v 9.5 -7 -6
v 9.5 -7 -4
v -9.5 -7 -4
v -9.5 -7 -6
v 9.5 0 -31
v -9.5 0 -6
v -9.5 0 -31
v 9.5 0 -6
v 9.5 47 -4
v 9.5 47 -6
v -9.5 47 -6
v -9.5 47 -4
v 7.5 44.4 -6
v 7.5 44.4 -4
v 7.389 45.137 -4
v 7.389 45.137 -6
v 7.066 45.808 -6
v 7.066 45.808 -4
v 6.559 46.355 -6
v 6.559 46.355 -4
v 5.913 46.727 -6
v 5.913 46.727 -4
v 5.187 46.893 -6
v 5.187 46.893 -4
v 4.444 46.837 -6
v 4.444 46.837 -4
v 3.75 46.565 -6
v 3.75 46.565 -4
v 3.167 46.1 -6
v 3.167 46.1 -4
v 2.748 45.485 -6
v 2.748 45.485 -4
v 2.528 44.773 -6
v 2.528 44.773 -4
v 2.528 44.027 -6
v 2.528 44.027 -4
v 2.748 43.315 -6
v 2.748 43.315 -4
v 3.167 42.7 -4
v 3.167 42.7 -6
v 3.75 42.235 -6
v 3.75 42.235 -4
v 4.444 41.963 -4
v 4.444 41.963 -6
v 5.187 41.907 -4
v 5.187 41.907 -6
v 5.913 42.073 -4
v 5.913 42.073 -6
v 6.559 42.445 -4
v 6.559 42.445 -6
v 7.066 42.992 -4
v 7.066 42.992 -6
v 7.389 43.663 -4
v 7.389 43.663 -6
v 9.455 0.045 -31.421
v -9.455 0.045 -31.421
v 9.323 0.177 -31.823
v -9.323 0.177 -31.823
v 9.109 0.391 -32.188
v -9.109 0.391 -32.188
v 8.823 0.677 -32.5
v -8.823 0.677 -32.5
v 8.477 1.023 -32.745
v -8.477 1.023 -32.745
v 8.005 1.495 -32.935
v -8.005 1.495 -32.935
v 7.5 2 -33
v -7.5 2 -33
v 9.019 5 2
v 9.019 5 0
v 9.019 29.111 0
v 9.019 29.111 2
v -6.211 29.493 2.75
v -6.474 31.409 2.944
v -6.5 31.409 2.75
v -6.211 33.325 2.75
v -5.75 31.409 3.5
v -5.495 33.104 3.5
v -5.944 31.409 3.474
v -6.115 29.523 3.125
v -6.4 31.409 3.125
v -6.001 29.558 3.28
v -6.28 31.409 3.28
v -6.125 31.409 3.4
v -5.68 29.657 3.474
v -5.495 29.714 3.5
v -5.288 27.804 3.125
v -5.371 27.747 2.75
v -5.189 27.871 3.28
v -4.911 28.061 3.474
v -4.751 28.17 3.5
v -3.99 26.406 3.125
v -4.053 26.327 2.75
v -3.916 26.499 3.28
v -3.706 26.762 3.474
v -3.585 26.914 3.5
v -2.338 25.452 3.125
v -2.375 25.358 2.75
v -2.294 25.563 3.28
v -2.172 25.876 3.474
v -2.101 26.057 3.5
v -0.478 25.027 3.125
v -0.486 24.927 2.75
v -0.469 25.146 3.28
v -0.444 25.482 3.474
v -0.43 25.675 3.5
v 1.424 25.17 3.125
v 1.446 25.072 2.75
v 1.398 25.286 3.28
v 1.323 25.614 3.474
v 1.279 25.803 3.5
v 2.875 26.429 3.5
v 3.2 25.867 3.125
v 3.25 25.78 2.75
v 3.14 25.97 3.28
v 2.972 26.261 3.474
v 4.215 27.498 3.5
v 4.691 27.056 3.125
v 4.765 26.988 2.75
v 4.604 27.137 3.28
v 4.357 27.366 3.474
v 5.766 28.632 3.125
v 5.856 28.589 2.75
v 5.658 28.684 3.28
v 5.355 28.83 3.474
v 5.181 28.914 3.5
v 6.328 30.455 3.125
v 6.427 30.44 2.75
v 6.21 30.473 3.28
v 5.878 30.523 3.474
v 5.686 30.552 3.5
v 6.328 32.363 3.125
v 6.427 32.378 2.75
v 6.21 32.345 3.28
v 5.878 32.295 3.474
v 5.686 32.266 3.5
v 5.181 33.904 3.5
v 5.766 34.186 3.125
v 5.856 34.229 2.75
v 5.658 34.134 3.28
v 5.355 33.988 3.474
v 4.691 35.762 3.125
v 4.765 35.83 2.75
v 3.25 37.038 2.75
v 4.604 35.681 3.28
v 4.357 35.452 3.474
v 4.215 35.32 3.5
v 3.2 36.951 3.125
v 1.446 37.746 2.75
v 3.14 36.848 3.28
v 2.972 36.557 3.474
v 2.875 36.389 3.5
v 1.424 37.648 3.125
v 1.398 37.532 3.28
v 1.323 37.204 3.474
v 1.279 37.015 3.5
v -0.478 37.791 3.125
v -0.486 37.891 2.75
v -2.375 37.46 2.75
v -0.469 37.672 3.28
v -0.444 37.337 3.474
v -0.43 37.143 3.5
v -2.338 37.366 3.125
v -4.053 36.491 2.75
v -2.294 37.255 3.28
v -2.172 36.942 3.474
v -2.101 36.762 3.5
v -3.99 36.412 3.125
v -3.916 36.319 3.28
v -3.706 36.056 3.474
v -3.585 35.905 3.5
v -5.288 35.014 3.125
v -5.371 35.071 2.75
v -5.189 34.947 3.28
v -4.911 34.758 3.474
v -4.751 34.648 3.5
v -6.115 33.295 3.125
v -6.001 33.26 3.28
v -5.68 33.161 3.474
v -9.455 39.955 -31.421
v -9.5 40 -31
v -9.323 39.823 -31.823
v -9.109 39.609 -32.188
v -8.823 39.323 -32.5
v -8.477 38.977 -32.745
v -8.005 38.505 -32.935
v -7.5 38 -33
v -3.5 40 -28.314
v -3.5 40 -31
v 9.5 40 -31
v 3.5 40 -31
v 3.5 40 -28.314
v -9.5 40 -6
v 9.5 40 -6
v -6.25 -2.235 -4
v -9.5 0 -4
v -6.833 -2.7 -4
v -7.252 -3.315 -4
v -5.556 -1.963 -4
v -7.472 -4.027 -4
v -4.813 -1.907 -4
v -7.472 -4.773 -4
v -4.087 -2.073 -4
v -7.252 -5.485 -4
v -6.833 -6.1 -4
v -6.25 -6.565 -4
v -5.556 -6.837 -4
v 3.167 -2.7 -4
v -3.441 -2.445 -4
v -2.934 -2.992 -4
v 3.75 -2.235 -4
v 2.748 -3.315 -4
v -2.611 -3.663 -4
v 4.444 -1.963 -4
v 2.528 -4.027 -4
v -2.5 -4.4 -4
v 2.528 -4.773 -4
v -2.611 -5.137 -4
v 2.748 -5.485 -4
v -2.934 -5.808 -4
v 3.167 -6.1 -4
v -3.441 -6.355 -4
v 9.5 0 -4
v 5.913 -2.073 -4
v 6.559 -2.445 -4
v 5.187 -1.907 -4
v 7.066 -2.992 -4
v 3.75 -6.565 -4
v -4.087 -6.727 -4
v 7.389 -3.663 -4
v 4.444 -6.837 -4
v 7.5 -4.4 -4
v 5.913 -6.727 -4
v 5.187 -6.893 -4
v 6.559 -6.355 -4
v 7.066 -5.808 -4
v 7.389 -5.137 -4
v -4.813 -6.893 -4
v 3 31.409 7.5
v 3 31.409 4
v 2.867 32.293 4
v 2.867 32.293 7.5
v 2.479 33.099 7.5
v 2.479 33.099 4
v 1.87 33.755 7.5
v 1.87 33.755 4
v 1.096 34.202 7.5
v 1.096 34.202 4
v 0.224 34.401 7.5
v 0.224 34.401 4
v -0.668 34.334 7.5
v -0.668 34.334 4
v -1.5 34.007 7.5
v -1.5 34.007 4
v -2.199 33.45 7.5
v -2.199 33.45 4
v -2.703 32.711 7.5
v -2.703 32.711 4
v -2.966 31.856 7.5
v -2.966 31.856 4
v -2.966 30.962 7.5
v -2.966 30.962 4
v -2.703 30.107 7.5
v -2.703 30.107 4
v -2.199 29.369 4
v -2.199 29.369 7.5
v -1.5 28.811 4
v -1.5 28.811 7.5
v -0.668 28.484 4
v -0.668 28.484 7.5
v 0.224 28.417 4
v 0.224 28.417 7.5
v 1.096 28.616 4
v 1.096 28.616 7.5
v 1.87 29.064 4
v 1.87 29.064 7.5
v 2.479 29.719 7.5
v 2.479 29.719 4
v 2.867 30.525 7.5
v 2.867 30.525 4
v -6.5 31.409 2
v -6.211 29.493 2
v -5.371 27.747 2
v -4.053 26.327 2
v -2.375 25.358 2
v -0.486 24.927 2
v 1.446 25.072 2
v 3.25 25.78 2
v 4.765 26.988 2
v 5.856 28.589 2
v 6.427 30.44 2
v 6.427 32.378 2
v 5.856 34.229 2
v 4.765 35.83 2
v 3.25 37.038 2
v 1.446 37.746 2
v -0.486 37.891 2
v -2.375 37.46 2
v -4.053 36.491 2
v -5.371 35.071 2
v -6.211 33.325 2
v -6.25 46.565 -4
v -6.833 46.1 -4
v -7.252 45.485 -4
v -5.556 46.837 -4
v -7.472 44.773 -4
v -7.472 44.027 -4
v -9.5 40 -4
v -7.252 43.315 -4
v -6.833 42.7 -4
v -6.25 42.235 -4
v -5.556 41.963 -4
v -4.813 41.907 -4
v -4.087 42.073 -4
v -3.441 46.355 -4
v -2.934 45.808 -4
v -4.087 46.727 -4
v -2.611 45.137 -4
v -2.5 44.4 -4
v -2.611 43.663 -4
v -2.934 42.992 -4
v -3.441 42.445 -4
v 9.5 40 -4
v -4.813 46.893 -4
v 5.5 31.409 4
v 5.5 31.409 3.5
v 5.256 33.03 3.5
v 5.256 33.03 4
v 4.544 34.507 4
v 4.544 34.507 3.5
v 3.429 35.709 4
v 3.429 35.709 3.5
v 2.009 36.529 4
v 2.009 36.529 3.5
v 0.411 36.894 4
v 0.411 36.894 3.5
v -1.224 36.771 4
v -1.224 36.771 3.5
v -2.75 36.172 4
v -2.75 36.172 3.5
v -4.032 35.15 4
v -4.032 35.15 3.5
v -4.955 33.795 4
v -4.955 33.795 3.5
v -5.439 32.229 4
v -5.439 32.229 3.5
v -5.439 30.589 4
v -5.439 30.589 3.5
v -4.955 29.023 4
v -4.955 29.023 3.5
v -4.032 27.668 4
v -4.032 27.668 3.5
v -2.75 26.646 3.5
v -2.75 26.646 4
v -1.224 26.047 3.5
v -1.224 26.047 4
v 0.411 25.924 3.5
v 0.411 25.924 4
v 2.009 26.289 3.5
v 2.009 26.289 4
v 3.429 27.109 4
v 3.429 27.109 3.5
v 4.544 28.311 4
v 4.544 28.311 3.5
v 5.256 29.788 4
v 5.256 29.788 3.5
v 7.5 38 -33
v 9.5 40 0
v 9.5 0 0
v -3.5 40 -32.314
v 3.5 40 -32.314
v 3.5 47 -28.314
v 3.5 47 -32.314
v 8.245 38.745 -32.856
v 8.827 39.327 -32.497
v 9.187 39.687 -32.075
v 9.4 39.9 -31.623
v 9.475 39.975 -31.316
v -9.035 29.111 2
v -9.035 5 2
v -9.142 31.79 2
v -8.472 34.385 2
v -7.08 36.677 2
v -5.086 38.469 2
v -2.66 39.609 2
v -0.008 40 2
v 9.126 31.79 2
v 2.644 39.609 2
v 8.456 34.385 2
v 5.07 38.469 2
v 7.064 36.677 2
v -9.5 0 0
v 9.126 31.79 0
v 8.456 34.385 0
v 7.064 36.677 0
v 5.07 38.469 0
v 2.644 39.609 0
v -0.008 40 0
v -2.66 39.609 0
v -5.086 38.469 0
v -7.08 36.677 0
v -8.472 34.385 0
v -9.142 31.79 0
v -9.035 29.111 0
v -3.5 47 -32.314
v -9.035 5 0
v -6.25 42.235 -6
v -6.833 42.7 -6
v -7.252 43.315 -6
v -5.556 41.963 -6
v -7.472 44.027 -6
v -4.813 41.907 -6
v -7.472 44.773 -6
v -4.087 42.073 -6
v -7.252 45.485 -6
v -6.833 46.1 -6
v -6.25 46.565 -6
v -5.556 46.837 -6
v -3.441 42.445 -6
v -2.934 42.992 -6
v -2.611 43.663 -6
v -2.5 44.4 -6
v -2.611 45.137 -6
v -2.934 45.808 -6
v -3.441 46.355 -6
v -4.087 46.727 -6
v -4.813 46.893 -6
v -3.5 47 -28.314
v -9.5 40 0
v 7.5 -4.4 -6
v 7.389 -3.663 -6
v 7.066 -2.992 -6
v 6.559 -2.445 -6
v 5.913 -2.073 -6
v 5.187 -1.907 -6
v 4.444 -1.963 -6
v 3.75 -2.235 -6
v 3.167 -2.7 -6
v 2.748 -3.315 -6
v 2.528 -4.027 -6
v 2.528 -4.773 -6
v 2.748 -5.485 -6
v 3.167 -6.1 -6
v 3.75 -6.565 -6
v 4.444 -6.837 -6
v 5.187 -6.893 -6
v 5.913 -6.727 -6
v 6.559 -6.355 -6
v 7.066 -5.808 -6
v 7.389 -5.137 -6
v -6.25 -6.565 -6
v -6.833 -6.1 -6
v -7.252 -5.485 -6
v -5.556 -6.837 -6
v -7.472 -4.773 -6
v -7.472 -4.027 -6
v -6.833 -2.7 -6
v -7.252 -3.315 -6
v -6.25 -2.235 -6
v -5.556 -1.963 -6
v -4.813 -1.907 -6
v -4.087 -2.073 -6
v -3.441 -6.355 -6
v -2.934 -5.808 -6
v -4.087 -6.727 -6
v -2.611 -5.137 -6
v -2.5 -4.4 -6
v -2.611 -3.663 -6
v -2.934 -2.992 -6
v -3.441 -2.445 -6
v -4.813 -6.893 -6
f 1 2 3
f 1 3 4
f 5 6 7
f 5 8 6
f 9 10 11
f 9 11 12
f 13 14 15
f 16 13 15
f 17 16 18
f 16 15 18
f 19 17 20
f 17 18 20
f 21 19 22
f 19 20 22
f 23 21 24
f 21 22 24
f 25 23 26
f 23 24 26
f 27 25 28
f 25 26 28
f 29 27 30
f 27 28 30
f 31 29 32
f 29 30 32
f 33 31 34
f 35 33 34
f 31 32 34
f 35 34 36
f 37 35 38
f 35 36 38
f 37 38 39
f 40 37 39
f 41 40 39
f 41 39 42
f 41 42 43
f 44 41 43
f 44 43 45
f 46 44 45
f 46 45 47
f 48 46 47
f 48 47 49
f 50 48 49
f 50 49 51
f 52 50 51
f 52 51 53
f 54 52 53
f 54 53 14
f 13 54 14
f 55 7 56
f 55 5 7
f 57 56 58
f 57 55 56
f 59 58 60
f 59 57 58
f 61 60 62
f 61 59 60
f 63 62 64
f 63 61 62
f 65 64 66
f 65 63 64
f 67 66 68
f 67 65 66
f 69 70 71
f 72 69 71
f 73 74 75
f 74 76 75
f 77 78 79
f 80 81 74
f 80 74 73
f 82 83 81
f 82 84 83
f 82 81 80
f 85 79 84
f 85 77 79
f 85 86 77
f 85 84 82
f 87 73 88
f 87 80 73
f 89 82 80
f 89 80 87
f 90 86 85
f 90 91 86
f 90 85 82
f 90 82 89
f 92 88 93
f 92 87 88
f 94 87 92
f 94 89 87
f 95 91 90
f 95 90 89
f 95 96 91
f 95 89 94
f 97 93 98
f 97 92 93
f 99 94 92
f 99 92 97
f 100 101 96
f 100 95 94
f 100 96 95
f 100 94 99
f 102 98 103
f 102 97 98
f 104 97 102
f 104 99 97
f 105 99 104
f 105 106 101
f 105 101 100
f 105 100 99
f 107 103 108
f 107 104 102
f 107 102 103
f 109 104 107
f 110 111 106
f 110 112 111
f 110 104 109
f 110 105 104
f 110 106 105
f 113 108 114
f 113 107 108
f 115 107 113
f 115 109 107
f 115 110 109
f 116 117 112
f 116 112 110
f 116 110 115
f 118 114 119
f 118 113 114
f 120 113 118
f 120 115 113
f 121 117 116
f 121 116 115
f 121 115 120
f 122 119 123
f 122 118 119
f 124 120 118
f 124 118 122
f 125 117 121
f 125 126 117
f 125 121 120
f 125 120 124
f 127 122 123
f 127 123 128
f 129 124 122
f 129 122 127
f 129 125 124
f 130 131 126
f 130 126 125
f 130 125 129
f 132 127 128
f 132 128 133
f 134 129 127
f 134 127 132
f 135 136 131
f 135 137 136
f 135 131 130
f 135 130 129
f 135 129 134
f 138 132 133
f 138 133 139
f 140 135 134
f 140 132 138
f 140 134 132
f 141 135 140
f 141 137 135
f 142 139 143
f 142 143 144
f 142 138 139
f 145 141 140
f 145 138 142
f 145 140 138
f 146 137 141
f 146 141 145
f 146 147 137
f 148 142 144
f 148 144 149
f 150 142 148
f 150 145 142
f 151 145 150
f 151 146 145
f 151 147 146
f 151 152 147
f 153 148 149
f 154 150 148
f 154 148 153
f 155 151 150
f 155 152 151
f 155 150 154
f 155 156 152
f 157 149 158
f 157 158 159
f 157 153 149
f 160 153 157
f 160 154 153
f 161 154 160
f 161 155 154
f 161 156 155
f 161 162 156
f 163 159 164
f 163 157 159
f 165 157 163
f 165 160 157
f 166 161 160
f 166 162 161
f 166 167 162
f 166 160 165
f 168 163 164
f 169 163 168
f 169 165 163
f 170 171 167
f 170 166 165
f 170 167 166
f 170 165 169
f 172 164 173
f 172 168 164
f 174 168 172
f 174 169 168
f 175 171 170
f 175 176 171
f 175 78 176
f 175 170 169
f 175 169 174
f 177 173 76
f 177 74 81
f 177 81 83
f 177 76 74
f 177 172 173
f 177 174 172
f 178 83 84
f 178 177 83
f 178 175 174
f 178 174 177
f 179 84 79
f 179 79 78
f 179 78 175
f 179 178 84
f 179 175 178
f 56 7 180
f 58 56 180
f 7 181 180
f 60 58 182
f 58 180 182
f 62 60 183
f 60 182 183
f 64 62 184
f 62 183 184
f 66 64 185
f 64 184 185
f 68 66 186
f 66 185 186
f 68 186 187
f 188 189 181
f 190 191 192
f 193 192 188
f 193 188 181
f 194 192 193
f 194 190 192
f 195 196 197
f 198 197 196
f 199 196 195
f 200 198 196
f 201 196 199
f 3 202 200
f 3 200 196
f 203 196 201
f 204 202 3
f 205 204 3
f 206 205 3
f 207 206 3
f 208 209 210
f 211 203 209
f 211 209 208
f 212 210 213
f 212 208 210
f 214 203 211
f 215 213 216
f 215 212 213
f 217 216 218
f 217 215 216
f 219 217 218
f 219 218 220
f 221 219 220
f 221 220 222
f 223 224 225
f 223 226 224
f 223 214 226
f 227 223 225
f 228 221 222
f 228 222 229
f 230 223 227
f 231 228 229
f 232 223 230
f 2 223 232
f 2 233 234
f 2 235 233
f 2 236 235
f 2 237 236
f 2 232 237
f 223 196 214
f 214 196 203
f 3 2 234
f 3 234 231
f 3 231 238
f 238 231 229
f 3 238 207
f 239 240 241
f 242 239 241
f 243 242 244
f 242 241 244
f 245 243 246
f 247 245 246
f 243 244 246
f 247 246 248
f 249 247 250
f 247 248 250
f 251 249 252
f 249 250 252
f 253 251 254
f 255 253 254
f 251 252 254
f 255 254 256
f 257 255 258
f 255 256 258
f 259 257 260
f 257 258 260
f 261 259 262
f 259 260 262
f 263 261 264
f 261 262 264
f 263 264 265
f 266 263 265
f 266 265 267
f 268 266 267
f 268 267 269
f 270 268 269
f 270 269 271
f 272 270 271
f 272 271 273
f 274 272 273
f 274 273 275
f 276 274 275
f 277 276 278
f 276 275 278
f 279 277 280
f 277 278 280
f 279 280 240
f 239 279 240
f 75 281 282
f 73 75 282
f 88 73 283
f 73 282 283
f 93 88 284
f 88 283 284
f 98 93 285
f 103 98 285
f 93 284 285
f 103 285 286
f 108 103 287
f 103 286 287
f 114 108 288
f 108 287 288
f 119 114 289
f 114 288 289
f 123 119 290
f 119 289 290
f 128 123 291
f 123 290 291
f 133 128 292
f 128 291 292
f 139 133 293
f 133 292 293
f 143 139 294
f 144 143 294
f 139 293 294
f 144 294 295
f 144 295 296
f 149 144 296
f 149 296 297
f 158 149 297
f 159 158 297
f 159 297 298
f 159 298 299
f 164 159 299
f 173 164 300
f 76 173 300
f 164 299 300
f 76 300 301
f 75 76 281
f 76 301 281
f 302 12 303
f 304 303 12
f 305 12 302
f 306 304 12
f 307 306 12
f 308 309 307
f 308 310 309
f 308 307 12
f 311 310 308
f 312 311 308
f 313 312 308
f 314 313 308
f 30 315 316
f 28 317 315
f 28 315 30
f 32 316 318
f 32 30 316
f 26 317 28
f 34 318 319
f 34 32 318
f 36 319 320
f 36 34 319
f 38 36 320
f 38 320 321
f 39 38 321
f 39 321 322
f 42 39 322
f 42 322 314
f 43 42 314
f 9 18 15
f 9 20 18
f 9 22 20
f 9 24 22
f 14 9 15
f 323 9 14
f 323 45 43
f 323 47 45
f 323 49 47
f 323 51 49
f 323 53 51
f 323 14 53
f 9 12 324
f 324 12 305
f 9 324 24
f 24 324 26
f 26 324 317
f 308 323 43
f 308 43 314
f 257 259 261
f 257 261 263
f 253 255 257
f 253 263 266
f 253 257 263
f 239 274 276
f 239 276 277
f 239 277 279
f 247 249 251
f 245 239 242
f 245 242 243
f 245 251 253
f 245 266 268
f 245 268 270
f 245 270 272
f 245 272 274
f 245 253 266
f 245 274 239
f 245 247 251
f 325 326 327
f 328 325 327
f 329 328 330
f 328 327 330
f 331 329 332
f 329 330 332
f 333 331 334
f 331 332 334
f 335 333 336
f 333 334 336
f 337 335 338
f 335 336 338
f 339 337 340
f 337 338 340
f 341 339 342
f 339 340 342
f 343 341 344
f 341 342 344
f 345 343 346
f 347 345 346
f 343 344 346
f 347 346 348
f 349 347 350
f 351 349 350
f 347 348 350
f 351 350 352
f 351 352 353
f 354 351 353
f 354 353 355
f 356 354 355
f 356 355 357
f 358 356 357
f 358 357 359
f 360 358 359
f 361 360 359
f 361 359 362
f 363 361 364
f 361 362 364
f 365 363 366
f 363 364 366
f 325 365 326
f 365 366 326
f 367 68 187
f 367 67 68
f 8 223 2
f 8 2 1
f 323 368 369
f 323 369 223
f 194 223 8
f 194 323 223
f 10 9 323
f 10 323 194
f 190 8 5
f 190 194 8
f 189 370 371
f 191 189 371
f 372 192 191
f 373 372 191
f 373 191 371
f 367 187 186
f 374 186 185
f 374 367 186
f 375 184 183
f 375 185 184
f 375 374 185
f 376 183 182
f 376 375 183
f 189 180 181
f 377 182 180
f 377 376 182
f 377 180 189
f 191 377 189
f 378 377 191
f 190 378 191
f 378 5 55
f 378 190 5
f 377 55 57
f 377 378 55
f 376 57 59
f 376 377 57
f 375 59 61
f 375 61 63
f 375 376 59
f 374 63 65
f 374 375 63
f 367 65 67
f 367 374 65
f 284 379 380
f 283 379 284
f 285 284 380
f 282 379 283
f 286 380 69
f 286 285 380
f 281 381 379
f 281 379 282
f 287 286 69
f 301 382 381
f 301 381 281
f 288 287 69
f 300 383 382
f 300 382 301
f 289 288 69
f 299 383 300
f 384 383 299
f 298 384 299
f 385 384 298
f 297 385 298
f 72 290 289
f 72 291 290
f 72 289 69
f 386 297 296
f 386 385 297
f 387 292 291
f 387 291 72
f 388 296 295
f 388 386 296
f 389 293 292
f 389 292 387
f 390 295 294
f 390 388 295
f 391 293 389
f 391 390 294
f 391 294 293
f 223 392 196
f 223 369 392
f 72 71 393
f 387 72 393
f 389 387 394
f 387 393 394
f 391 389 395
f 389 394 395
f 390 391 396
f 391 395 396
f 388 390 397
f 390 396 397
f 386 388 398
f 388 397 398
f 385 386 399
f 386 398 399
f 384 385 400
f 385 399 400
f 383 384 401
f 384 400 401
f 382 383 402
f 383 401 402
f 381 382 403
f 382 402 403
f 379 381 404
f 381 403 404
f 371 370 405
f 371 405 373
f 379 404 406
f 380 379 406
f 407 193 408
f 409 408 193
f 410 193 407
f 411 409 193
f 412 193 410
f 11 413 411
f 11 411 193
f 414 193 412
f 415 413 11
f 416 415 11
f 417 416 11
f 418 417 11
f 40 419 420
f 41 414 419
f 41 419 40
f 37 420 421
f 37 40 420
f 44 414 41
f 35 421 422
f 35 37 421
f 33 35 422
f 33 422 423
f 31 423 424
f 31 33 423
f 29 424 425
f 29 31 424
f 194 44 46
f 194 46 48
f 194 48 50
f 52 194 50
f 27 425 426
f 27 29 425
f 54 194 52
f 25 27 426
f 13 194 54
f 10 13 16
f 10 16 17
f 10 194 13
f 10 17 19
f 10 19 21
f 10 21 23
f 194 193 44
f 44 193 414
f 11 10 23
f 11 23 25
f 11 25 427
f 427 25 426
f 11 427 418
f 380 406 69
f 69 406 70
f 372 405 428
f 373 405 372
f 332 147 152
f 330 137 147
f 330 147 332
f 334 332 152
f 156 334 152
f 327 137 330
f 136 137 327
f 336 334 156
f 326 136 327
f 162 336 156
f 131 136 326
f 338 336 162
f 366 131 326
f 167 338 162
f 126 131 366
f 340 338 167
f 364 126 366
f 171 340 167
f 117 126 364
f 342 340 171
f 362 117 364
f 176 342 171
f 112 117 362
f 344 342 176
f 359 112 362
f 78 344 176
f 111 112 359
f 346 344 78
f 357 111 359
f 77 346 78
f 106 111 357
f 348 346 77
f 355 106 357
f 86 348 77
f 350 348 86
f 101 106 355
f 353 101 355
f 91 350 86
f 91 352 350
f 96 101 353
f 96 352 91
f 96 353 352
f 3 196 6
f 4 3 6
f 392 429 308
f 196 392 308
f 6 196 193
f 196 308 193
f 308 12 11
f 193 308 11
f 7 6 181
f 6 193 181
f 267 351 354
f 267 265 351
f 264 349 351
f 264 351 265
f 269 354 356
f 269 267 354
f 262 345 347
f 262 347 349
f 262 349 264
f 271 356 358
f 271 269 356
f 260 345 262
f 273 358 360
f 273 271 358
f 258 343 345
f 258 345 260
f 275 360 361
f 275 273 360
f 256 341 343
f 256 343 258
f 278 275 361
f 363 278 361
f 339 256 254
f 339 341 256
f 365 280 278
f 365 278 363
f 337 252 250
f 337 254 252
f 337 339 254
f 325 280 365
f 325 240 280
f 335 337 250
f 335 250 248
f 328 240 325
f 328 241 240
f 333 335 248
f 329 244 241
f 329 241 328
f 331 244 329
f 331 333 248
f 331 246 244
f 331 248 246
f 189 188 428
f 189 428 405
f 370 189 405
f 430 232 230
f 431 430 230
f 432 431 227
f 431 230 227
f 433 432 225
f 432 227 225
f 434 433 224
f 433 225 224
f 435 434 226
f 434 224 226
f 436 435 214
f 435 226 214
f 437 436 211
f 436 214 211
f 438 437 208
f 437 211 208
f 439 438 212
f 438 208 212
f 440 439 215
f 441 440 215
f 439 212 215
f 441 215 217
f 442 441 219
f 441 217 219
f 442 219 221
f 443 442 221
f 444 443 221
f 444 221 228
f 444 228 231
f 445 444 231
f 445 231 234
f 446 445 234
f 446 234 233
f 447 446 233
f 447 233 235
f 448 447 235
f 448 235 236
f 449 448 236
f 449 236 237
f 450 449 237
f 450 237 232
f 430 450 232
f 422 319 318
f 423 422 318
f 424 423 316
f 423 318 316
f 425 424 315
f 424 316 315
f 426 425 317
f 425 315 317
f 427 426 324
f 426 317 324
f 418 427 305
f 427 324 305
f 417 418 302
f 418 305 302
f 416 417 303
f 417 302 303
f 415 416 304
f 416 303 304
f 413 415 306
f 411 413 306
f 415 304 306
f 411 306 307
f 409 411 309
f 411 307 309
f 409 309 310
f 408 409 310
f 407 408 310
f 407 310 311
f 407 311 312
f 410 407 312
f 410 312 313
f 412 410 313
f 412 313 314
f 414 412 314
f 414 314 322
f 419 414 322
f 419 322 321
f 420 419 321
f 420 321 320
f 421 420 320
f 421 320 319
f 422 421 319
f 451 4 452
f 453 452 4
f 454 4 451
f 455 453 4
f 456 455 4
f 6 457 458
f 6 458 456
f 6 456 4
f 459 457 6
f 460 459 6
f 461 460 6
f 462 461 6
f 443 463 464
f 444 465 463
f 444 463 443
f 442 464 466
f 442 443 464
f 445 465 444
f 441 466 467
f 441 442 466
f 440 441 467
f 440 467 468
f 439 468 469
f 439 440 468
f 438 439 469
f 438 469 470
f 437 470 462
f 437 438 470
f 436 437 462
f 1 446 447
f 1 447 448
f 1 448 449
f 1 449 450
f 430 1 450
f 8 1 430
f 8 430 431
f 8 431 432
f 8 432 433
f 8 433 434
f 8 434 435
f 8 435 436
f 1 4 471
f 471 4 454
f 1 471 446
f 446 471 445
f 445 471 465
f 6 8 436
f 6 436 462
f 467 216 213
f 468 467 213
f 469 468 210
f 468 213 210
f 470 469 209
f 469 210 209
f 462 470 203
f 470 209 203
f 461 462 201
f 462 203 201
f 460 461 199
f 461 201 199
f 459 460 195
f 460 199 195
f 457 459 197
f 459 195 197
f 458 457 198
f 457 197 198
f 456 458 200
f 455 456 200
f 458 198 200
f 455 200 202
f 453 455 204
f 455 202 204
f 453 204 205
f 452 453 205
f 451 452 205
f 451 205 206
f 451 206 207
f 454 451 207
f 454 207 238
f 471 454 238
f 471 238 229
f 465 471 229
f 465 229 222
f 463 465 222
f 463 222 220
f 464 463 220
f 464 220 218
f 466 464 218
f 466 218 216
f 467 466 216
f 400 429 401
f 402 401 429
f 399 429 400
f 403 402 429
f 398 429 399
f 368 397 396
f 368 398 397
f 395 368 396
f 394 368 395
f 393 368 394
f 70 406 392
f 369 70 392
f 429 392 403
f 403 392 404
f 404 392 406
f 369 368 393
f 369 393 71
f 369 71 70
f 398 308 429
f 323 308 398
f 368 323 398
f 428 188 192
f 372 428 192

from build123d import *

# Parameters (mm, degrees)
BOSS_EXTRU_1_DEPTH       = 9.5
ESQUISSE3_R              = 2.5
ENL_V_MAT_EXTRU_40_DEPTH = 10
BOSS_EXTRU_2_DEPTH       = 2
CONG_1_R                 = 2
ESQUISSE5_R              = 6.5
BOSS_EXTRU_3_DEPTH       = 1.5
CONG_2_R                 = 0.75
ESQUISSE6_R              = 5.5
BOSS_EXTRU_4_DEPTH       = 0.5
ESQUISSE7_R              = 3
BOSS_EXTRU_5_DEPTH       = 3.5
ESQUISSE8_W              = 7
ESQUISSE8_H              = 4
BOSS_EXTRU_6_DEPTH       = 7


with BuildPart() as part:
    # Esquisse1 → Boss.-Extru.1 (new, symmetric)
    with BuildSketch(Plane(origin=(0, 0, 0), x_dir=(0, 0, -1), z_dir=(1, 0, 0))):
        Polygon((0, 0), (4, 0), (4, -7), (6, -7), (6, 0), (33, 0), (33, 40), (6, 40), (6, 47), (4, 47), (4, 40), (0, 40), align=None)
    extrude(amount=BOSS_EXTRU_1_DEPTH, both=True)

    # Esquisse3 → Enlèv. mat.-Extru.40 (cut)
    with BuildSketch(Plane.XY.offset(-4)):
        with Locations((5, 44.4)):
            Circle(ESQUISSE3_R)
        with Locations((-5, 44.4)):
            Circle(ESQUISSE3_R)
        with Locations((5, -4.4)):
            Circle(ESQUISSE3_R)
        with Locations((-5, -4.4)):
            Circle(ESQUISSE3_R)
    extrude(amount=-ENL_V_MAT_EXTRU_40_DEPTH, mode=Mode.SUBTRACT)

    # Esquisse4 → Boss.-Extru.2 (add)
    with BuildSketch(Plane.XY):
        with BuildLine():
            Line((-9.034932354, 5), (9.018945802, 5))
            Line((9.018945802, 5), (9.018945802, 29.110938176))
            ThreePointArc((9.018945802, 29.110938176), (-0.007993276, 40), (-9.034932354, 29.110938176))
            Line((-9.034932354, 29.110938176), (-9.034932354, 5))
        make_face()
    extrude(amount=BOSS_EXTRU_2_DEPTH)

    # Congé1
    cong_1_edges = [part.edges().sort_by_distance(p)[0] for p in [
        (-9.5, 20, -33),
        (0, 40, -33),
        (0, 0, -33),
        (9.5, 20, -33),
    ]]
    fillet(cong_1_edges, radius=CONG_1_R)

    # Esquisse5 → Boss.-Extru.3 (add)
    with BuildSketch(Plane.XY.offset(2)):
        with Locations(Location((0, 31.4090745, 0), (0, 0, 180))):
            Circle(ESQUISSE5_R)
    extrude(amount=BOSS_EXTRU_3_DEPTH)

    # Congé2
    cong_2_edges = [part.edges().sort_by_distance(p)[0] for p in [
        (6.5, 31.4090745, 3.5),
    ]]
    fillet(cong_2_edges, radius=CONG_2_R)

    # Esquisse6 → Boss.-Extru.4 (add)
    with BuildSketch(Plane.XY.offset(3.5)):
        with Locations((0, 31.4090745)):
            Circle(ESQUISSE6_R)
    extrude(amount=BOSS_EXTRU_4_DEPTH)

    # Esquisse7 → Boss.-Extru.5 (add)
    with BuildSketch(Plane.XY.offset(4)):
        with Locations((0, 31.4090745)):
            Circle(ESQUISSE7_R)
    extrude(amount=BOSS_EXTRU_5_DEPTH)

    # Esquisse8 → Boss.-Extru.6 (add)
    with BuildSketch(Plane(origin=(0, 40, 0), x_dir=(1, 0, 0), z_dir=(0, 1, 0))):
        with Locations((0, 30.314213562)):
            Rectangle(ESQUISSE8_W, ESQUISSE8_H)
    extrude(amount=BOSS_EXTRU_6_DEPTH)


solid = part.part
